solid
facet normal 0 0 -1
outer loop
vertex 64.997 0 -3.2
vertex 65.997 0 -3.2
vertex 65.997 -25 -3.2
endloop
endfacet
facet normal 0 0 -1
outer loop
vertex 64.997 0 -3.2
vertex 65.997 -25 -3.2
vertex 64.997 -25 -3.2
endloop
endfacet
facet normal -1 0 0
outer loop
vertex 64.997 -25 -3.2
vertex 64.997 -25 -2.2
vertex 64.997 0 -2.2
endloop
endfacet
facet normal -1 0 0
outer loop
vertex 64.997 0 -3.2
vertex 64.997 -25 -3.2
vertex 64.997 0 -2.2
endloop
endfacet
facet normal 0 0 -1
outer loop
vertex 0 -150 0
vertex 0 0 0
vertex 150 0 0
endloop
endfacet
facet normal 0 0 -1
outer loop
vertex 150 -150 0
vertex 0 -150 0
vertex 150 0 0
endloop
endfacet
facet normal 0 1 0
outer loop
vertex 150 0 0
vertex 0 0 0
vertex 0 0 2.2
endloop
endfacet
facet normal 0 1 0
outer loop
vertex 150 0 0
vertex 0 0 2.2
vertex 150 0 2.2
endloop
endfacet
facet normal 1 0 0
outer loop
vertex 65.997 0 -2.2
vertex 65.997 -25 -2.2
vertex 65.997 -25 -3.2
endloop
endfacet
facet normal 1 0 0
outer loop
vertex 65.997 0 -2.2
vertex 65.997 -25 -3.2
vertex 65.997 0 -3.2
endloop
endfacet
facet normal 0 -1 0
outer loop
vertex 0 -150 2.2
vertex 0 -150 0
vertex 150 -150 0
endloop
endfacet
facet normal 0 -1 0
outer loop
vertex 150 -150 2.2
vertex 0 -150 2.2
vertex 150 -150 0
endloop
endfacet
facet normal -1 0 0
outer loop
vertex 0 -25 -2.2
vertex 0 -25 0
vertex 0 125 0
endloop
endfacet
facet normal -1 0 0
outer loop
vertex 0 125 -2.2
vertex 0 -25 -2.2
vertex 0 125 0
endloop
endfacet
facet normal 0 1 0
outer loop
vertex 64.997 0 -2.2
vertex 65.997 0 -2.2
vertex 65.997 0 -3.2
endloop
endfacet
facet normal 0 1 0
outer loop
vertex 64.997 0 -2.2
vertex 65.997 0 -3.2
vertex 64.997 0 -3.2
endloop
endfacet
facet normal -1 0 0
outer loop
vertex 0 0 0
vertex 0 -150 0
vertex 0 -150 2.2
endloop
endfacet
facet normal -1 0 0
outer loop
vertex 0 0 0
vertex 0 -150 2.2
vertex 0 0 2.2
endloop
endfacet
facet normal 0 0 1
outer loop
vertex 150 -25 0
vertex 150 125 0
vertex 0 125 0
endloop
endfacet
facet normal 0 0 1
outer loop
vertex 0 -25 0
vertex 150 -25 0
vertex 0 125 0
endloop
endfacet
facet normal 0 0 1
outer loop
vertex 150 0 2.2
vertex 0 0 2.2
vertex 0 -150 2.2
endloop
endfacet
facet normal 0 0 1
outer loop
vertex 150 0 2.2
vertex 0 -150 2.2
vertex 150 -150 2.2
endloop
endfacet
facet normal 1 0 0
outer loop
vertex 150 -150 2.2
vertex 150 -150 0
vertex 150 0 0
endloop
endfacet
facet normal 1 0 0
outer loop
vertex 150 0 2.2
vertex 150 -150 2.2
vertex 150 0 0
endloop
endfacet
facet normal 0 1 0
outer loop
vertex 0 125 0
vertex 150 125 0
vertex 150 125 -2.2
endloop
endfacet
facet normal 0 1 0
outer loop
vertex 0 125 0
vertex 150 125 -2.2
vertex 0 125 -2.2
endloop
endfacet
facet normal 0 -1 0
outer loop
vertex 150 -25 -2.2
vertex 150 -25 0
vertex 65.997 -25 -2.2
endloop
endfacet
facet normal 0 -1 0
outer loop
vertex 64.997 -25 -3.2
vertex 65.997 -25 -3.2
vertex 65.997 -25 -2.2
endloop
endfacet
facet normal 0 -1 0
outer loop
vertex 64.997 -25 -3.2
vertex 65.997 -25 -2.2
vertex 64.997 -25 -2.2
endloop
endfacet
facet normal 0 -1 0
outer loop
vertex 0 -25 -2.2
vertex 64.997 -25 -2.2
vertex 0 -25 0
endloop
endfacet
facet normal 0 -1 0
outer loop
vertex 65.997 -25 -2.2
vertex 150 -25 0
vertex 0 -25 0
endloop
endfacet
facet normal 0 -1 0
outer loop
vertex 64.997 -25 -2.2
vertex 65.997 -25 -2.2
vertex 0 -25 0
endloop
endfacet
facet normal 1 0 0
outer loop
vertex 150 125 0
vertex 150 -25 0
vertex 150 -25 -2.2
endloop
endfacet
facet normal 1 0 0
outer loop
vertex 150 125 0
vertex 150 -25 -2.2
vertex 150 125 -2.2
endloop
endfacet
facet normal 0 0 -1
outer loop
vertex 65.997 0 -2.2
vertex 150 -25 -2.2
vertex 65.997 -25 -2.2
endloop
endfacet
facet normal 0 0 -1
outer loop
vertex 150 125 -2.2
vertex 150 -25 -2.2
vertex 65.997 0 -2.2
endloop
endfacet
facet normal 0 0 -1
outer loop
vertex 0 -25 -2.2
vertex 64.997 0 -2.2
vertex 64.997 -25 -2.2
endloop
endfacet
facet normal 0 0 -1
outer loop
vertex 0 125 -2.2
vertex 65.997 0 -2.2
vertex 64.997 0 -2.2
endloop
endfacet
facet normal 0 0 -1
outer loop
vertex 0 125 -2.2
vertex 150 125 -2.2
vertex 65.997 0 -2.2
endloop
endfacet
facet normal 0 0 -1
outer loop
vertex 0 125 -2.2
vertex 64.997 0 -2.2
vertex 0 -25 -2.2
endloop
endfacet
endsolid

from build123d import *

# Parameters (mm, degrees)
SKIZZE2_W                       = 150
SKIZZE2_H                       = 150
AUFSATZ_LINEAR_AUSTRAGEN1_DEPTH = 2.2
SKIZZE3_W                       = 150
SKIZZE3_H                       = 150
AUFSATZ_LINEAR_AUSTRAGEN3_DEPTH = 2.2
SKIZZE4_W                       = 1
SKIZZE4_H                       = 25
AUFSATZ_LINEAR_AUSTRAGEN4_DEPTH = 1


with BuildPart() as part:
    # Skizze2 → Aufsatz-Linear austragen1 (new body)
    with BuildSketch(Plane.XY):
        with Locations((75, -75)):
            Rectangle(SKIZZE2_W, SKIZZE2_H)
    extrude(amount=AUFSATZ_LINEAR_AUSTRAGEN1_DEPTH)


with BuildPart() as body_2:
    # Skizze3 → Aufsatz-Linear austragen3 (new body)
    with BuildSketch(Plane(origin=(0, 0, 0), x_dir=(-1, 0, 0), z_dir=(0, 0, -1))):
        with Locations((-75, 50)):
            Rectangle(SKIZZE3_W, SKIZZE3_H)
    extrude(amount=AUFSATZ_LINEAR_AUSTRAGEN3_DEPTH)

    # Skizze4 → Aufsatz-Linear austragen4 (add)
    with BuildSketch(Plane(origin=(0, 0, -2.2), x_dir=(-1, 0, 0), z_dir=(0, 0, -1))):
        with Locations((-65.497224617, -12.5)):
            Rectangle(SKIZZE4_W, SKIZZE4_H)
    extrude(amount=AUFSATZ_LINEAR_AUSTRAGEN4_DEPTH)


solid = Compound([part.part, body_2.part])
